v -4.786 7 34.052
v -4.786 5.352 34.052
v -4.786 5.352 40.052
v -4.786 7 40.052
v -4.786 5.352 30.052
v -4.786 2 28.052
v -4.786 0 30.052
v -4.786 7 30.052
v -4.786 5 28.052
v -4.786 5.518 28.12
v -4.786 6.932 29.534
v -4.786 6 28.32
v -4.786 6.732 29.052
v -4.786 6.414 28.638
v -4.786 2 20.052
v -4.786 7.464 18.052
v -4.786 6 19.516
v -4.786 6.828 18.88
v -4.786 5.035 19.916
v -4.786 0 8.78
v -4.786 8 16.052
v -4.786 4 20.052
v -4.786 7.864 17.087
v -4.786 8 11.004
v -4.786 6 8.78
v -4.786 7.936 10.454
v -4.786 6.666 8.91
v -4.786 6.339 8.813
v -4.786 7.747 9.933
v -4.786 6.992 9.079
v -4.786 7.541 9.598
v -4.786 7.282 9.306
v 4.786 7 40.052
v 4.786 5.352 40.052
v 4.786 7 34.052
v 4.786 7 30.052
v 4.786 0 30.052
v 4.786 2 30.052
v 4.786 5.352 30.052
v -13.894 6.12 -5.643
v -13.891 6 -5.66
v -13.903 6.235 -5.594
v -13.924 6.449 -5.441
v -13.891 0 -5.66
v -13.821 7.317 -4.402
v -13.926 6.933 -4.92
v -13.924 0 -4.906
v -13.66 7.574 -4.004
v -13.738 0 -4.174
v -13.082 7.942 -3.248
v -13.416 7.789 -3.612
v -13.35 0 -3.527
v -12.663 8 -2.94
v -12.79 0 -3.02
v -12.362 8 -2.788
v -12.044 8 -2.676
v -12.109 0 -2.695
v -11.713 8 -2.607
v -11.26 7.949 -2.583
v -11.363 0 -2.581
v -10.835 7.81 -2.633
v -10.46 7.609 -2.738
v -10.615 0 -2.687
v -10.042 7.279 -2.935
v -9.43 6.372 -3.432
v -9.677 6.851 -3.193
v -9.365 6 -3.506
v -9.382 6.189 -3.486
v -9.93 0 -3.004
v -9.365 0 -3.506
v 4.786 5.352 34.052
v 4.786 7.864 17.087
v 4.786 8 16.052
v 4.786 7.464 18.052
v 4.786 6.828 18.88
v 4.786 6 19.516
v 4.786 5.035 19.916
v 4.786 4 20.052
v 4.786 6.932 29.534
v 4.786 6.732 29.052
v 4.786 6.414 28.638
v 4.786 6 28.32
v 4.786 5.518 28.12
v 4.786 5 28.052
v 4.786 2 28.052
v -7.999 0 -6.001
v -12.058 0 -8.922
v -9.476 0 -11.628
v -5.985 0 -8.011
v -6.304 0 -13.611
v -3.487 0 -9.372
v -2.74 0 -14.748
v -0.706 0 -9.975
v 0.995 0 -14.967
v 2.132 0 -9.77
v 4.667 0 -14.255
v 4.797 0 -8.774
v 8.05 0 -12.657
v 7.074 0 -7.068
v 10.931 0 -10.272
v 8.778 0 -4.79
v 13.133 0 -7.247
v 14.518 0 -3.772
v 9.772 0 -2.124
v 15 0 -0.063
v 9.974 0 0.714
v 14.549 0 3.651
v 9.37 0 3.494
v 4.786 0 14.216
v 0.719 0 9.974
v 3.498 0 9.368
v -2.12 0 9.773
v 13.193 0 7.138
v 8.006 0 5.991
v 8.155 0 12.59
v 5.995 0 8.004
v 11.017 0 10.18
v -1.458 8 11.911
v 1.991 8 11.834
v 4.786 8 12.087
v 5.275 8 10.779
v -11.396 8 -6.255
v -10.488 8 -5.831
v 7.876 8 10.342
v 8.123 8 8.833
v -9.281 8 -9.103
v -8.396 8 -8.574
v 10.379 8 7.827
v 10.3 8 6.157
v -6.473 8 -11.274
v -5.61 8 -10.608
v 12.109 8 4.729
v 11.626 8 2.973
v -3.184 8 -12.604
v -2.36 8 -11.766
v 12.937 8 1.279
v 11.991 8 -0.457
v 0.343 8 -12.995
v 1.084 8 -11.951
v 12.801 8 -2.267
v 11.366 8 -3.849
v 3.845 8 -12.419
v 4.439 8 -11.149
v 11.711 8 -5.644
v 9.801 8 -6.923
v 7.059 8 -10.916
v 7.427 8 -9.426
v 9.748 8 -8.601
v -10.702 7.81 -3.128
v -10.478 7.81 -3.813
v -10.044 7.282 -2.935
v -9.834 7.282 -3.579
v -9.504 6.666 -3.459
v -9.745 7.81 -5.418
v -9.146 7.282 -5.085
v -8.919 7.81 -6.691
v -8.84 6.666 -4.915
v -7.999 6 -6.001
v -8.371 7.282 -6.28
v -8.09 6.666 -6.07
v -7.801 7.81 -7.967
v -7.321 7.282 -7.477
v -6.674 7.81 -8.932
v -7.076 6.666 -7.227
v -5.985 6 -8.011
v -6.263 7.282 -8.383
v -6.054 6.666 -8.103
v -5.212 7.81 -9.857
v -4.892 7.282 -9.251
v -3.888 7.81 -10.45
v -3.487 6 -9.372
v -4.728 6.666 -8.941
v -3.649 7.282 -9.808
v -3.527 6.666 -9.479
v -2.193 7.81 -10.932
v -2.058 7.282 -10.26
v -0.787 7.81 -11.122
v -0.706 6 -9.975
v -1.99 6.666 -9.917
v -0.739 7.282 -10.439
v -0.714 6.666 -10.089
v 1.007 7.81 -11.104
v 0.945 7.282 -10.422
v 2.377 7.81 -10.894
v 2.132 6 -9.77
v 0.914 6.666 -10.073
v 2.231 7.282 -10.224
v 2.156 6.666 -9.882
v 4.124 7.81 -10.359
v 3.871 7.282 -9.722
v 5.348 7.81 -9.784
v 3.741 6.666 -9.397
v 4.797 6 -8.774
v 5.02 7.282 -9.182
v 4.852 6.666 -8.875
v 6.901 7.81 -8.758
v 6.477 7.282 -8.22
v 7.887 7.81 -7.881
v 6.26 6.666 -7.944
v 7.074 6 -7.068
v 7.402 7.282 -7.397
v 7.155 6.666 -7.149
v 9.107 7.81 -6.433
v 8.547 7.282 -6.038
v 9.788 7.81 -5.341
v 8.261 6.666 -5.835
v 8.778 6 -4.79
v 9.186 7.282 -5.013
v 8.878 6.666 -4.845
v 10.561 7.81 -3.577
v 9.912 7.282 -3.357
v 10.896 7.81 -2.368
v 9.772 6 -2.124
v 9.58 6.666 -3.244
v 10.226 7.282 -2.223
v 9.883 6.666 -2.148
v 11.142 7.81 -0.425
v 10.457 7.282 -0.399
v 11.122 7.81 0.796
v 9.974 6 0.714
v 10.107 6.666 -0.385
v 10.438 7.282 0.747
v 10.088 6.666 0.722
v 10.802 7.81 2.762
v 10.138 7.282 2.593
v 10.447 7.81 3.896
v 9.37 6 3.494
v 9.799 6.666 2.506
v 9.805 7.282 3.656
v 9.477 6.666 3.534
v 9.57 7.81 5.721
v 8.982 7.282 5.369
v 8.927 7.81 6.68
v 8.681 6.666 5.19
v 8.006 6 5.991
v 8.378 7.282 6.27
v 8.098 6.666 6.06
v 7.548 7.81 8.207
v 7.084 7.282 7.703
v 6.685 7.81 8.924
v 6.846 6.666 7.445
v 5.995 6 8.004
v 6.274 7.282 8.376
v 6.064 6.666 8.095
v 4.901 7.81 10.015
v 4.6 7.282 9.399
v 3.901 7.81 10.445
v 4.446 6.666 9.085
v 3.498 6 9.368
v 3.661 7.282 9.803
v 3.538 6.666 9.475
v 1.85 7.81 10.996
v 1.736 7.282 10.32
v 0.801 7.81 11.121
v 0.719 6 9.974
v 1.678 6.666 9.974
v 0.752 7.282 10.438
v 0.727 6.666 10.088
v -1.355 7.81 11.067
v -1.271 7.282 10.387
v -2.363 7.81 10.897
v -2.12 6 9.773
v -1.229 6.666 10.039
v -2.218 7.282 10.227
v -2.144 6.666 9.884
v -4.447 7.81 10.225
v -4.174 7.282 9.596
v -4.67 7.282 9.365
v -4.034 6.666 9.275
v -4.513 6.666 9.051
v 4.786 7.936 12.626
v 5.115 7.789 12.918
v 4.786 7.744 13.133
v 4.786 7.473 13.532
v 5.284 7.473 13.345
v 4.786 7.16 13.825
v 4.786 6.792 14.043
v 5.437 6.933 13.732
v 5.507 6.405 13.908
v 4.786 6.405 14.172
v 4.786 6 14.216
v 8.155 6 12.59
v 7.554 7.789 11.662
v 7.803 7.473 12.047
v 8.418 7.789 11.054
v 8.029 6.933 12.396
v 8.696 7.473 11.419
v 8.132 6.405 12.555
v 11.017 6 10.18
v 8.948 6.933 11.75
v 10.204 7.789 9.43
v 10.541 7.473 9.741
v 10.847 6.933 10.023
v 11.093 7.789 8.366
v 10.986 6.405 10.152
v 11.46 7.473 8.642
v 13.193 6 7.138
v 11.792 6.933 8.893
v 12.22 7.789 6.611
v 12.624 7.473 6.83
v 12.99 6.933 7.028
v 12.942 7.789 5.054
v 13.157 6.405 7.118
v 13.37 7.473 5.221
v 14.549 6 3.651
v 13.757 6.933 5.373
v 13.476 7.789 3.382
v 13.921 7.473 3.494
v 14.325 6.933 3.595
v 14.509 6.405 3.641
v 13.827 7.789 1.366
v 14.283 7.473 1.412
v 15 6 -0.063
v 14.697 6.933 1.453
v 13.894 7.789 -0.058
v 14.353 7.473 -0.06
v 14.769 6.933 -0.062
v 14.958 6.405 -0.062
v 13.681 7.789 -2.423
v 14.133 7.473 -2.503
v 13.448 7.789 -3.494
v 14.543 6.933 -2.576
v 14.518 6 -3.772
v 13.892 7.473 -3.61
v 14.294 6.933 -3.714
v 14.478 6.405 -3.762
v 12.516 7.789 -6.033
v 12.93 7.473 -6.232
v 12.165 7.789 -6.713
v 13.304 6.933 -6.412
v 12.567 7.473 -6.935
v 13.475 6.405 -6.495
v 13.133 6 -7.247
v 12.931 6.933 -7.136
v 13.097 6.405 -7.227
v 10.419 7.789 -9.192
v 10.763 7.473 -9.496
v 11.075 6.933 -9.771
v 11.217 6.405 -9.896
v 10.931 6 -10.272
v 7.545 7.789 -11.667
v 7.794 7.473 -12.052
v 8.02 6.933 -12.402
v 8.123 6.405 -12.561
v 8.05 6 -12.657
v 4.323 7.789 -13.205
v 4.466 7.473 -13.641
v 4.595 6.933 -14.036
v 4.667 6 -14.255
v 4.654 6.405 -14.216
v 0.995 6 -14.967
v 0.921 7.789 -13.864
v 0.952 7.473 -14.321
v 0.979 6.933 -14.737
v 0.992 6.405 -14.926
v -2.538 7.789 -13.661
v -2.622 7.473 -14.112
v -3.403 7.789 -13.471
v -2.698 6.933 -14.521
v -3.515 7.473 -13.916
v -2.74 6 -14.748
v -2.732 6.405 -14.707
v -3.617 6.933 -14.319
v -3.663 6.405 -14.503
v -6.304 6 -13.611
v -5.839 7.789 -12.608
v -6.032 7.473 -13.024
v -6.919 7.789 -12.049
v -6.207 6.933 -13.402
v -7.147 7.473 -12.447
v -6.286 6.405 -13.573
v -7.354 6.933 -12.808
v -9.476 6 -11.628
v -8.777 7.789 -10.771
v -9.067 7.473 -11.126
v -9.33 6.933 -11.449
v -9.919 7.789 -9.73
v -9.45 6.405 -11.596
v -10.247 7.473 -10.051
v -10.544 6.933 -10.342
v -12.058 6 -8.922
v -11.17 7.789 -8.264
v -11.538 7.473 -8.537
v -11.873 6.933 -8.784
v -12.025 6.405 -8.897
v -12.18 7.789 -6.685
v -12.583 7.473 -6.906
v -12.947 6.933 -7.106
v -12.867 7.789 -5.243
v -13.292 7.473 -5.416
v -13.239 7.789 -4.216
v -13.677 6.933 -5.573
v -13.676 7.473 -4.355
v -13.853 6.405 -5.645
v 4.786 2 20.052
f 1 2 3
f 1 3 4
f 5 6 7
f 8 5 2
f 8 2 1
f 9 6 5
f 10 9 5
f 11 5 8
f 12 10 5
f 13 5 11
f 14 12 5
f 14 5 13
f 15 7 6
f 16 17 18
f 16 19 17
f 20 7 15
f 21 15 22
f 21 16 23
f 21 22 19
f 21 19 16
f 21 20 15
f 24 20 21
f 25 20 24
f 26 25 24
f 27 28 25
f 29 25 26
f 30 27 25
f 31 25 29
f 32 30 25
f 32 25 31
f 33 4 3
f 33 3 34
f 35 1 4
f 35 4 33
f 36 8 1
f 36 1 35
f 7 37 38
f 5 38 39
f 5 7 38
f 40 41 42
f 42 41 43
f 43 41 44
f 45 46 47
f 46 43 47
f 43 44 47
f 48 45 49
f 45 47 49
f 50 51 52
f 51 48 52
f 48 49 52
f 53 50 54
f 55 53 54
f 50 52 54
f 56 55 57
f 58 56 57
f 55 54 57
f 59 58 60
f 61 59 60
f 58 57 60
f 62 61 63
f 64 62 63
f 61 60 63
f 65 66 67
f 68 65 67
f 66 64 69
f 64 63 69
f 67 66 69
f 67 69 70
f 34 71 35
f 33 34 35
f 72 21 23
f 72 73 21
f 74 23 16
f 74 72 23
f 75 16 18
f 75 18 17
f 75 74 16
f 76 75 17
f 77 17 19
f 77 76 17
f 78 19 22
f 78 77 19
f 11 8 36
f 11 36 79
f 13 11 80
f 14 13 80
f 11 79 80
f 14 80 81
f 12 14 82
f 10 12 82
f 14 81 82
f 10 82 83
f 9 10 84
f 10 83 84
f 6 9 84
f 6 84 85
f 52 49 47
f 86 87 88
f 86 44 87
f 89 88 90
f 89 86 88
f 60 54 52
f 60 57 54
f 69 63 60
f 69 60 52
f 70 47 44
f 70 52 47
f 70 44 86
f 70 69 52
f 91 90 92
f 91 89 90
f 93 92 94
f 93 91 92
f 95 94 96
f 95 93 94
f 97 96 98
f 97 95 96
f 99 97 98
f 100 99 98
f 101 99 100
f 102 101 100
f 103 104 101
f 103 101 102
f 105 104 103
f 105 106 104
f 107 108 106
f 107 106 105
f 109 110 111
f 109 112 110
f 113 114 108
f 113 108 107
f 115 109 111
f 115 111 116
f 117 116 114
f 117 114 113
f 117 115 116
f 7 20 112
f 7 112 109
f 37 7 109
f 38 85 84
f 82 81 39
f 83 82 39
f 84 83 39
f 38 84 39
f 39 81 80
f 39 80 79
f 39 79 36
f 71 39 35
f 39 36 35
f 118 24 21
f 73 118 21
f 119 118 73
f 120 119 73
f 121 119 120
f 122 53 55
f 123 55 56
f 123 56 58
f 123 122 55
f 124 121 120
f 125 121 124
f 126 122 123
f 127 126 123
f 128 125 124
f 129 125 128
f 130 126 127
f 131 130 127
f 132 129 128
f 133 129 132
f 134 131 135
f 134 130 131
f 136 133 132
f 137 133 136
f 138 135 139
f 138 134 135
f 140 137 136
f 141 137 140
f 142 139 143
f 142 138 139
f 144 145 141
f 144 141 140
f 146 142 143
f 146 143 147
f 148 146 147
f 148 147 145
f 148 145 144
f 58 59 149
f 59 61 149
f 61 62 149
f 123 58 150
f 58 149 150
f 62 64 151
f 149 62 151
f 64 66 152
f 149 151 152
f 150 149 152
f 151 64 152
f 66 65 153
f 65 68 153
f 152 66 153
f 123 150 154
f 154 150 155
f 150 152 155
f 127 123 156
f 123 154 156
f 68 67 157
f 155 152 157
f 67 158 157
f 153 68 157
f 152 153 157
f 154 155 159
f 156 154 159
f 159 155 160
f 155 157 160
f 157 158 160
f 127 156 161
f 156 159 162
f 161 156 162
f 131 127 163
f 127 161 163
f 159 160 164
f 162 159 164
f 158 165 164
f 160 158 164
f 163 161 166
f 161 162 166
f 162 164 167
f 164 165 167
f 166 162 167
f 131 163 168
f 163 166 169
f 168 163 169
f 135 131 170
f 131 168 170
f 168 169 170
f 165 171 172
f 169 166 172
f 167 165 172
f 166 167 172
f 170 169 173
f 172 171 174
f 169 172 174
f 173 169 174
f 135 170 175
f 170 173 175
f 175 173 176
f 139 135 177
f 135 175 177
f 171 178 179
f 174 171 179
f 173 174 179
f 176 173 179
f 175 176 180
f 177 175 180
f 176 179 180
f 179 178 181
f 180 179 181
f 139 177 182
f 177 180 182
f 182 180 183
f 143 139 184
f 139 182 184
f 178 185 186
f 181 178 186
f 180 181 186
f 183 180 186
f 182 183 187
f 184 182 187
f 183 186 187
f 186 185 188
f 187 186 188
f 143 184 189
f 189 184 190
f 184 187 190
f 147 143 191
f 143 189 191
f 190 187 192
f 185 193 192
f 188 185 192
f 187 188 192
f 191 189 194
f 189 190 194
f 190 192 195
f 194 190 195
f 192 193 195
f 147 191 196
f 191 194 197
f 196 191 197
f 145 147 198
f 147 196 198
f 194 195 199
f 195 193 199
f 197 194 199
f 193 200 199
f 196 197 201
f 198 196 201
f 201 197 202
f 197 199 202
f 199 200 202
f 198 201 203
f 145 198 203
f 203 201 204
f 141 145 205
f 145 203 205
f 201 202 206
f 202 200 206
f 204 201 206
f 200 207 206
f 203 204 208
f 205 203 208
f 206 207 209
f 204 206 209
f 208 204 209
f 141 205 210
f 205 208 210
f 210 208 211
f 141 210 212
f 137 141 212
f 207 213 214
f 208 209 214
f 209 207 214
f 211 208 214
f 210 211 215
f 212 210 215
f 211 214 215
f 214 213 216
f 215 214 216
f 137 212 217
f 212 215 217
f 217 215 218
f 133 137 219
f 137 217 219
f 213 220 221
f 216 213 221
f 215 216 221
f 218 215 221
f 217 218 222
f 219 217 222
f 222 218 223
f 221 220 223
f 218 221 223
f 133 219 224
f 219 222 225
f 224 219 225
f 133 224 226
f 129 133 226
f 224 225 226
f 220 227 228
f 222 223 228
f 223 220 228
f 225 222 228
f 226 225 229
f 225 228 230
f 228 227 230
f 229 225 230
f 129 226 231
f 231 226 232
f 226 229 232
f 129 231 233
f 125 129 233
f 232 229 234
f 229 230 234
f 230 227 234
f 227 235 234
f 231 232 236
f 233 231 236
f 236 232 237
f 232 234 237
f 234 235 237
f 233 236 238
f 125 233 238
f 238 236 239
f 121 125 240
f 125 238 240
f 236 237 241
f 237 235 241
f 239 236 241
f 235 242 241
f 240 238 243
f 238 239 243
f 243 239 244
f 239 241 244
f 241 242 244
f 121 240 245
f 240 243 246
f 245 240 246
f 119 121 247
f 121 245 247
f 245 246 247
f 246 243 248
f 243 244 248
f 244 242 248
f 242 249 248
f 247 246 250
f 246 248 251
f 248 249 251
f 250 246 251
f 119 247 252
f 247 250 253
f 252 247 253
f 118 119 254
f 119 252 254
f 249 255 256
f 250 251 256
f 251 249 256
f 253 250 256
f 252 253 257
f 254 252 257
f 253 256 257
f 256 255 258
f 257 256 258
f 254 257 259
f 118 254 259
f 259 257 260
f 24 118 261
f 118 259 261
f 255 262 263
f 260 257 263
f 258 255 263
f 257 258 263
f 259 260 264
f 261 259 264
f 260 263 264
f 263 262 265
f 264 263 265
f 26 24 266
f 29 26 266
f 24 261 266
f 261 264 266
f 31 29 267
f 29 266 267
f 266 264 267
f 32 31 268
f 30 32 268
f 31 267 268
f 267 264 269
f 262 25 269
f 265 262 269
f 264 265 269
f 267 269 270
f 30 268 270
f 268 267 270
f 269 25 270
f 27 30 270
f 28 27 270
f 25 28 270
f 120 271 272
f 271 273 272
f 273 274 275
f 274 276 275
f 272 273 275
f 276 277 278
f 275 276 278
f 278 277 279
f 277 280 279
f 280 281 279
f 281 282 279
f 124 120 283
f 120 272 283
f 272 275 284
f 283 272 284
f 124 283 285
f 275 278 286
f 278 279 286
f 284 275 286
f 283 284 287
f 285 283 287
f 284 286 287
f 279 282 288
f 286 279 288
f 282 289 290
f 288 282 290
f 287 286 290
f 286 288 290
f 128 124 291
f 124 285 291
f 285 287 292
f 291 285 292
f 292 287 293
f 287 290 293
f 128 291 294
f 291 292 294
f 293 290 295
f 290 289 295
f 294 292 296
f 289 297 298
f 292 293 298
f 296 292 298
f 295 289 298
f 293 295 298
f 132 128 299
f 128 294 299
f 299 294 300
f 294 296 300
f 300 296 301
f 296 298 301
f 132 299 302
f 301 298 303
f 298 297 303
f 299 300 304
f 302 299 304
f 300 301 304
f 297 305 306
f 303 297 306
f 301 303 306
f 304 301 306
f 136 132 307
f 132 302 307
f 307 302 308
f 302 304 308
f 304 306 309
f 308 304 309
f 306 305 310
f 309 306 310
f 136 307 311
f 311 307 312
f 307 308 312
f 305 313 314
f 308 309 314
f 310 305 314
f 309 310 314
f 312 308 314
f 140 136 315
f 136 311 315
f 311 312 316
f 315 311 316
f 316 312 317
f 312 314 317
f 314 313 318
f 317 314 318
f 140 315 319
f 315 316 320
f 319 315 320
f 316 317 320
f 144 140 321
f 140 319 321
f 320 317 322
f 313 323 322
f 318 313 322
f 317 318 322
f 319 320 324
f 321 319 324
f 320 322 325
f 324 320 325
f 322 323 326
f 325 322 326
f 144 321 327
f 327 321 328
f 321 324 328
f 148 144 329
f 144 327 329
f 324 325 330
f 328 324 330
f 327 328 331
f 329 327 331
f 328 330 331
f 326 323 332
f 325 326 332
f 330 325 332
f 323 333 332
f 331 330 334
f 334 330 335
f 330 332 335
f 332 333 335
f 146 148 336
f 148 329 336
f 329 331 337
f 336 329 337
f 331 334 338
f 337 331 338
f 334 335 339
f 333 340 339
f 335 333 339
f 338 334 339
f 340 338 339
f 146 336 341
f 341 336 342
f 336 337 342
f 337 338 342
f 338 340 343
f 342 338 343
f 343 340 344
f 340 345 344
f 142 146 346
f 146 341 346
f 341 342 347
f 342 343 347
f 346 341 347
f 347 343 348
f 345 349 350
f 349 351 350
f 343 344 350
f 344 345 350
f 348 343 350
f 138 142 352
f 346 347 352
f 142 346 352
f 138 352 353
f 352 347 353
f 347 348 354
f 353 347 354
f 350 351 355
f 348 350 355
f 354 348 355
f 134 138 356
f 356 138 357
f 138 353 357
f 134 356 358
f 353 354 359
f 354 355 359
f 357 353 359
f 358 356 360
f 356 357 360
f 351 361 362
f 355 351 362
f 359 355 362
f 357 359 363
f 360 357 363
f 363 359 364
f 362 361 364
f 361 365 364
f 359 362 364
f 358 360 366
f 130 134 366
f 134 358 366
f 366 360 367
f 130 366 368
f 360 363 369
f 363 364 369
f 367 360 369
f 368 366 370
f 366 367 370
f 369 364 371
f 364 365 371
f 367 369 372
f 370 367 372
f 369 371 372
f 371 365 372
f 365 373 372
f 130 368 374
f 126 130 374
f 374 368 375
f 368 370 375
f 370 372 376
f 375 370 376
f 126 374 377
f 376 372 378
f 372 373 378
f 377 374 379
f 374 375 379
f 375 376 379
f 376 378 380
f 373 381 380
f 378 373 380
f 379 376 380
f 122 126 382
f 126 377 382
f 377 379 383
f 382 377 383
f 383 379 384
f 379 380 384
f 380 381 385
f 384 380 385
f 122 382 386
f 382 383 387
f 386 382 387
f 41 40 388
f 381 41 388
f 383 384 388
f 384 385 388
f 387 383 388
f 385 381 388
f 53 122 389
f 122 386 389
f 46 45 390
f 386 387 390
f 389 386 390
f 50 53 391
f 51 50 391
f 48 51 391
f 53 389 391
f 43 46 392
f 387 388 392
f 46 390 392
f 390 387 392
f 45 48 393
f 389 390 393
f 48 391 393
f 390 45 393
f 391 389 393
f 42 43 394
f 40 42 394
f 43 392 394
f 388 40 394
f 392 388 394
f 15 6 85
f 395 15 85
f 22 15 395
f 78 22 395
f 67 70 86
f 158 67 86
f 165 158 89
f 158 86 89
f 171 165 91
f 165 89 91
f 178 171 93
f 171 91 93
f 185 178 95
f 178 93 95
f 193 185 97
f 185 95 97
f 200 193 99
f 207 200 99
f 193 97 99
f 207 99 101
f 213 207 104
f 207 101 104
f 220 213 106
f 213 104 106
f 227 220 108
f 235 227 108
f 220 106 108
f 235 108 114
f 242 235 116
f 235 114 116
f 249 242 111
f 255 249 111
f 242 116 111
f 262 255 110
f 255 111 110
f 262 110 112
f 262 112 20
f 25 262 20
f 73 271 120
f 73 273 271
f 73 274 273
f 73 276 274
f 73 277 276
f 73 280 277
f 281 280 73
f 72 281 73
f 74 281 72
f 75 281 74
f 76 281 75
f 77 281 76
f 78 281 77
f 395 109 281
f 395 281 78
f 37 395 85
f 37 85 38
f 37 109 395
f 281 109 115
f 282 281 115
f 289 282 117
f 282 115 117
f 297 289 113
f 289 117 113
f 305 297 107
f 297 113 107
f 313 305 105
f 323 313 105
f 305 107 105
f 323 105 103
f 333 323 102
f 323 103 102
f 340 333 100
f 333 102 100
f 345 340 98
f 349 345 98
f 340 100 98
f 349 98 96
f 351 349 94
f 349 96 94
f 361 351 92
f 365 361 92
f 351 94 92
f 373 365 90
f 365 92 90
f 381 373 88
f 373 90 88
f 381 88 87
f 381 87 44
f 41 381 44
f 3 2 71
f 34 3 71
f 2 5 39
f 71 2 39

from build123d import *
from build123d.topology import SkipClean

# Parameters (mm, degrees)
BOSS_EXTRUDE1_DEPTH = 8
SKETCH2_W           = 9.571982136
SKETCH2_H           = 10
BOSS_EXTRUDE2_DEPTH = 2
BOSS_EXTRUDE3_DEPTH = 9.571982
FILLET1_R           = 2
FILLET2_R           = 4
FILLET3_R           = 2
SKETCH4_W           = 9.571982136
SKETCH4_H           = 1.647948381
BOSS_EXTRUDE4_DEPTH = 6


with BuildPart() as part:
    # Sketch1 → Boss-Extrude1 (new body)
    with BuildSketch(Plane(origin=(0, 0, 0), x_dir=(1, 0, 0), z_dir=(0, 1, 0))):
        with BuildLine():
            Line((-4.785991068, -8.780335386), (-4.785991068, -20.052065634))
            Line((-4.785991068, -20.052065634), (4.785991068, -20.052065634))
            Line((4.785991068, -20.052065634), (4.785991068, -14.215987109))
            ThreePointArc((4.785991068, -14.215987109), (10.931257236, 10.271689989), (-13.891030007, 5.660325552))
            ThreePointArc((-13.891030007, 5.660325552), (-12.461541016, 2.832721051), (-9.365408089, 3.505585733))
            ThreePointArc((-9.365408089, 3.505585733), (9.370244872, 3.492636688), (-4.785991068, -8.780335386))
        make_face()
    extrude(amount=BOSS_EXTRUDE1_DEPTH)

    # Sketch2 → Boss-Extrude2 (add)
    with BuildSketch(Plane.XZ):
        with Locations((0, 25.052065634)):
            Rectangle(SKETCH2_W, SKETCH2_H)
    extrude(amount=-BOSS_EXTRUDE2_DEPTH)

    # Sketch3 → Boss-Extrude3 (add)
    with SkipClean():  # the faces are left unmerged after this step: merging them gives an invalid solid
        with BuildSketch(Plane.ZY.offset(4.785991068)):
            Polygon((28.052065634, 2), (30.052065634, 2), (30.052065634, 5.352051619), (34.052065634, 5.352051619), (34.052065634, 7), (28.052065634, 7), align=None)
        extrude(amount=-BOSS_EXTRUDE3_DEPTH)

    # Fillet1
    fillet1_edges = [part.edges().sort_by_distance(p)[0] for p in [
        (-6.8e-08, 7, 28.052065634),
    ]]
    fillet(fillet1_edges, radius=FILLET1_R)

    # Fillet2
    fillet2_edges = [part.edges().sort_by_distance(p)[0] for p in [
        (0, 8, 20.052065634),
    ]]
    fillet(fillet2_edges, radius=FILLET2_R)

    # Fillet3
    fillet3_edges = [part.edges().sort_by_distance(p)[0] for p in [
        (9.370244872, 8, -3.492636688),
        (10.931257236, 8, -10.271689989),
    ]]
    fillet(fillet3_edges, radius=FILLET3_R)

    # Sketch4 → Boss-Extrude4 (add)
    with BuildSketch(Plane.XY.offset(34.052065634)):
        with Locations((0, 6.17602581)):
            Rectangle(SKETCH4_W, SKETCH4_H)
    extrude(amount=BOSS_EXTRUDE4_DEPTH)


solid = part.part
